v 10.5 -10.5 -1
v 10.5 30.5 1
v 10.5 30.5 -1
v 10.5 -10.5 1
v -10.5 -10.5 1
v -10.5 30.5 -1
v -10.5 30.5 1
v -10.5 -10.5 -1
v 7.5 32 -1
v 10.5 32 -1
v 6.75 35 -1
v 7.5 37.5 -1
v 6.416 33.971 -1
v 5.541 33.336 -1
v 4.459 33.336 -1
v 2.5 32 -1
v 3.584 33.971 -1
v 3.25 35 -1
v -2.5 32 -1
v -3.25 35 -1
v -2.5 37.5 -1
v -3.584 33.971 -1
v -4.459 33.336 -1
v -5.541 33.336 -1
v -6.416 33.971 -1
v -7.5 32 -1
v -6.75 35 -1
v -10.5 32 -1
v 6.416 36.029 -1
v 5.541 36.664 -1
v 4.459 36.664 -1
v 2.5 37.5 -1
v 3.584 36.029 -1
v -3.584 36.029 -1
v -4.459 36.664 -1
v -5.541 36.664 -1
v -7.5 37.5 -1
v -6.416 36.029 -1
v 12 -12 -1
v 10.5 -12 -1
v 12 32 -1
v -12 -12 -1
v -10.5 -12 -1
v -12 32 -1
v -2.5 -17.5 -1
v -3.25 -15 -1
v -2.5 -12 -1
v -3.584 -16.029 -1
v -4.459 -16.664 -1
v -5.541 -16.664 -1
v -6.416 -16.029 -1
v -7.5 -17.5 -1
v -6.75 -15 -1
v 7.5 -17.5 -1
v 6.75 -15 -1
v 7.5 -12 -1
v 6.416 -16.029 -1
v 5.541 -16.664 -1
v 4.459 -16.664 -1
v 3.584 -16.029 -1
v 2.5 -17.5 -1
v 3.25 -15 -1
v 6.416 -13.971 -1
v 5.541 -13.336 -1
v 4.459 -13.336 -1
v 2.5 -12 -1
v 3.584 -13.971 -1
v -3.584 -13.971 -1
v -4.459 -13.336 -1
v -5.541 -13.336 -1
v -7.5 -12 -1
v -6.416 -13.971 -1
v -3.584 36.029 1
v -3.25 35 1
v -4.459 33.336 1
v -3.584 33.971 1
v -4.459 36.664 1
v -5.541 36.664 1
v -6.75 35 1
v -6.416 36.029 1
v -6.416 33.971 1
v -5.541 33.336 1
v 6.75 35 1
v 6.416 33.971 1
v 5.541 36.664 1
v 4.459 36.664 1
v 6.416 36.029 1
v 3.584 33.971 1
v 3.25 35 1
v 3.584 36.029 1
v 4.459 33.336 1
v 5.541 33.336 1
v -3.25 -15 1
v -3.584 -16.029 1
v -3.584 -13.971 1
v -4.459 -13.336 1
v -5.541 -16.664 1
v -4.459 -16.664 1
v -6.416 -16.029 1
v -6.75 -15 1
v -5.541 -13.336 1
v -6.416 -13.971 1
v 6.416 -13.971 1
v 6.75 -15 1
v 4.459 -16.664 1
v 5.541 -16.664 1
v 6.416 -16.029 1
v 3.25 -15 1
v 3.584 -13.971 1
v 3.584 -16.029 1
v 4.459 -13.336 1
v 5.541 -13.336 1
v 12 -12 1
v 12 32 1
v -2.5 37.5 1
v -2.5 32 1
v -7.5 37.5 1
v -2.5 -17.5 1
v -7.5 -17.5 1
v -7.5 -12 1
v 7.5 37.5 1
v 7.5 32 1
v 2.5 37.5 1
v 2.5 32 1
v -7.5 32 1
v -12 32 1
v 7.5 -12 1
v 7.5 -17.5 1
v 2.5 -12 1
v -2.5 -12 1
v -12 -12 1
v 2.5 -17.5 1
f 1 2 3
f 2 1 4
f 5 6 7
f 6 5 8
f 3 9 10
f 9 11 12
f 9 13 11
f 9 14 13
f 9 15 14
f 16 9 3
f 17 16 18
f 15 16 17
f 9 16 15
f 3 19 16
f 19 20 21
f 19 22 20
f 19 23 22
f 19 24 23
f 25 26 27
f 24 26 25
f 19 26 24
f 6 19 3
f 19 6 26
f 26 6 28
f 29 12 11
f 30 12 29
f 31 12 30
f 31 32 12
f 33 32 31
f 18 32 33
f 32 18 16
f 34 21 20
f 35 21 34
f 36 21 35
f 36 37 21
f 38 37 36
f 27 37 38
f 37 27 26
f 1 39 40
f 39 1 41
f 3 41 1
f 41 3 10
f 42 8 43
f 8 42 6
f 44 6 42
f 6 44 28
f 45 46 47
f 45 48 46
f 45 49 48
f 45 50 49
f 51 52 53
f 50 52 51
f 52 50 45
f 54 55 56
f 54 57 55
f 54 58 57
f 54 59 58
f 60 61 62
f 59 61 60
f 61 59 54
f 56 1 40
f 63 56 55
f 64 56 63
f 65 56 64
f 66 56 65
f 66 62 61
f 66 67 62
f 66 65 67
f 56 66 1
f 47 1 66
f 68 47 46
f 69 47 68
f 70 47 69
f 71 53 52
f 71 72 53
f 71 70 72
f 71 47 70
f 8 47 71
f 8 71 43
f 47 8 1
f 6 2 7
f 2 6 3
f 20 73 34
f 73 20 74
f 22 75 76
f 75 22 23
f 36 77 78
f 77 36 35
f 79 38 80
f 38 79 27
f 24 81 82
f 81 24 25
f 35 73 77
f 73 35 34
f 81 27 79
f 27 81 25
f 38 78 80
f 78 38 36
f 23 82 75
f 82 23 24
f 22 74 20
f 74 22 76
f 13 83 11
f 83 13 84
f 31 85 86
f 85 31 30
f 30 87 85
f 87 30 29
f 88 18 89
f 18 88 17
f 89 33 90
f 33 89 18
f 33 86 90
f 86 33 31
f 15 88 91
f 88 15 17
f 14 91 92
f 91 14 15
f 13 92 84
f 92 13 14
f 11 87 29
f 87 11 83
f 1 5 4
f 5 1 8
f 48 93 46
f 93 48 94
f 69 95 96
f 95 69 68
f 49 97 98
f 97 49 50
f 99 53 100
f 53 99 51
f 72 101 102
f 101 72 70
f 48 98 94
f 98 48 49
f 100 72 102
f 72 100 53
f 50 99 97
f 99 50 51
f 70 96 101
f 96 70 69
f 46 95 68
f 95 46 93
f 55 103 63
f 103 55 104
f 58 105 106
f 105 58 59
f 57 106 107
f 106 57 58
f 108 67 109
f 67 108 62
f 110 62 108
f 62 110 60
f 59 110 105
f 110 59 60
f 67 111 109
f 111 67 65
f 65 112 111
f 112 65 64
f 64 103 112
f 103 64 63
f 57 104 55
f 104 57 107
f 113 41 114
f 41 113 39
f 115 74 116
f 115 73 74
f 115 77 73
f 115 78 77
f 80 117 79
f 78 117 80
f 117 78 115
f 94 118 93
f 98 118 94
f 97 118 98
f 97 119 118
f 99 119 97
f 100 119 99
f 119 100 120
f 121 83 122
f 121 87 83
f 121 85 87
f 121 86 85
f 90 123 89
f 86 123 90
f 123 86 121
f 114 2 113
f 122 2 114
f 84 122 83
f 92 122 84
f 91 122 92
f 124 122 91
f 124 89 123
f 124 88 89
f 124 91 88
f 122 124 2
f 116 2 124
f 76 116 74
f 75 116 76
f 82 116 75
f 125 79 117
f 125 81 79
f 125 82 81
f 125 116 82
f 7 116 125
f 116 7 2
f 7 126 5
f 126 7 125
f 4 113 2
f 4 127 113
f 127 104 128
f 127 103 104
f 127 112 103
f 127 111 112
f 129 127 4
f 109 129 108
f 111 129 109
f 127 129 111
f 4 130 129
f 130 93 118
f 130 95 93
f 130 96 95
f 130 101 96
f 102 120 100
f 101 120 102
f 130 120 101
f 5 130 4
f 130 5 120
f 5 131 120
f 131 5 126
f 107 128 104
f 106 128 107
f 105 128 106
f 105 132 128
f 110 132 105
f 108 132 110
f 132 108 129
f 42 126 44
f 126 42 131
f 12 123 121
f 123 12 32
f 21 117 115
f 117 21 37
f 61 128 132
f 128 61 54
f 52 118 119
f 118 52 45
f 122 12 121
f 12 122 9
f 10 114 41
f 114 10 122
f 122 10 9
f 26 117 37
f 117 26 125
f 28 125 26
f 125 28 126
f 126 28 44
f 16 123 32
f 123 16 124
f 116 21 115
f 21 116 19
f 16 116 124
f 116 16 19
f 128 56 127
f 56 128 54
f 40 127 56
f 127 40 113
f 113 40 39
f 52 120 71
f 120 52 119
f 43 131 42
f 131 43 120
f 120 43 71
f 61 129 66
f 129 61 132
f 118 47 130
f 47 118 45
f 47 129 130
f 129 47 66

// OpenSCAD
fa=100;

module servomask() { 
  module hole(pos) {
    rotate(a=[0,90,0]) translate(pos) cylinder(r=1.75, h=20, $fn=fa/10);
  }
  module bracket() {
    translate([0,-0.75,0]) cube([5, 7.5, 21], center=true);
    translate([3,-0.75,0]) cube([1, 7.5, 2], center=true);
    hole([5,0,-9.5]);
    hole([-5,0,-9.5]);
  }
  union() {
    translate([0,10,0]) union() {
      translate([-20, -20.5, -10.5]) cube([40, 41, 21]);
      mirror([0,1,0]) translate([9.5,25,0]) bracket();
      translate([9.5,25,0]) bracket();
    }
    rotate(a=[0,90,0]) translate([0,0,20]) cylinder(r=3, h=7, $fn=fa/10);
  }
}

difference() {
  translate([0,10,0]) cube([24,55,2], center=true);
  #translate([7.5,32,-1.5]) cube([10,10,3]);
  #translate([-17.5,32,-1.5]) cube([10,10,3]);
  #translate([-2.5,32,-1.5]) cube([5,10,3]);
  #translate([7.5,-22,-1.5]) cube([10,10,3]);
  #translate([-17.5,-22,-1.5]) cube([10,10,3]);
  #translate([-2.5,-22,-1.5]) cube([5,10,3]);
  #translate([0,0,6]) rotate(a=[0,90,0]) servomask();
}
